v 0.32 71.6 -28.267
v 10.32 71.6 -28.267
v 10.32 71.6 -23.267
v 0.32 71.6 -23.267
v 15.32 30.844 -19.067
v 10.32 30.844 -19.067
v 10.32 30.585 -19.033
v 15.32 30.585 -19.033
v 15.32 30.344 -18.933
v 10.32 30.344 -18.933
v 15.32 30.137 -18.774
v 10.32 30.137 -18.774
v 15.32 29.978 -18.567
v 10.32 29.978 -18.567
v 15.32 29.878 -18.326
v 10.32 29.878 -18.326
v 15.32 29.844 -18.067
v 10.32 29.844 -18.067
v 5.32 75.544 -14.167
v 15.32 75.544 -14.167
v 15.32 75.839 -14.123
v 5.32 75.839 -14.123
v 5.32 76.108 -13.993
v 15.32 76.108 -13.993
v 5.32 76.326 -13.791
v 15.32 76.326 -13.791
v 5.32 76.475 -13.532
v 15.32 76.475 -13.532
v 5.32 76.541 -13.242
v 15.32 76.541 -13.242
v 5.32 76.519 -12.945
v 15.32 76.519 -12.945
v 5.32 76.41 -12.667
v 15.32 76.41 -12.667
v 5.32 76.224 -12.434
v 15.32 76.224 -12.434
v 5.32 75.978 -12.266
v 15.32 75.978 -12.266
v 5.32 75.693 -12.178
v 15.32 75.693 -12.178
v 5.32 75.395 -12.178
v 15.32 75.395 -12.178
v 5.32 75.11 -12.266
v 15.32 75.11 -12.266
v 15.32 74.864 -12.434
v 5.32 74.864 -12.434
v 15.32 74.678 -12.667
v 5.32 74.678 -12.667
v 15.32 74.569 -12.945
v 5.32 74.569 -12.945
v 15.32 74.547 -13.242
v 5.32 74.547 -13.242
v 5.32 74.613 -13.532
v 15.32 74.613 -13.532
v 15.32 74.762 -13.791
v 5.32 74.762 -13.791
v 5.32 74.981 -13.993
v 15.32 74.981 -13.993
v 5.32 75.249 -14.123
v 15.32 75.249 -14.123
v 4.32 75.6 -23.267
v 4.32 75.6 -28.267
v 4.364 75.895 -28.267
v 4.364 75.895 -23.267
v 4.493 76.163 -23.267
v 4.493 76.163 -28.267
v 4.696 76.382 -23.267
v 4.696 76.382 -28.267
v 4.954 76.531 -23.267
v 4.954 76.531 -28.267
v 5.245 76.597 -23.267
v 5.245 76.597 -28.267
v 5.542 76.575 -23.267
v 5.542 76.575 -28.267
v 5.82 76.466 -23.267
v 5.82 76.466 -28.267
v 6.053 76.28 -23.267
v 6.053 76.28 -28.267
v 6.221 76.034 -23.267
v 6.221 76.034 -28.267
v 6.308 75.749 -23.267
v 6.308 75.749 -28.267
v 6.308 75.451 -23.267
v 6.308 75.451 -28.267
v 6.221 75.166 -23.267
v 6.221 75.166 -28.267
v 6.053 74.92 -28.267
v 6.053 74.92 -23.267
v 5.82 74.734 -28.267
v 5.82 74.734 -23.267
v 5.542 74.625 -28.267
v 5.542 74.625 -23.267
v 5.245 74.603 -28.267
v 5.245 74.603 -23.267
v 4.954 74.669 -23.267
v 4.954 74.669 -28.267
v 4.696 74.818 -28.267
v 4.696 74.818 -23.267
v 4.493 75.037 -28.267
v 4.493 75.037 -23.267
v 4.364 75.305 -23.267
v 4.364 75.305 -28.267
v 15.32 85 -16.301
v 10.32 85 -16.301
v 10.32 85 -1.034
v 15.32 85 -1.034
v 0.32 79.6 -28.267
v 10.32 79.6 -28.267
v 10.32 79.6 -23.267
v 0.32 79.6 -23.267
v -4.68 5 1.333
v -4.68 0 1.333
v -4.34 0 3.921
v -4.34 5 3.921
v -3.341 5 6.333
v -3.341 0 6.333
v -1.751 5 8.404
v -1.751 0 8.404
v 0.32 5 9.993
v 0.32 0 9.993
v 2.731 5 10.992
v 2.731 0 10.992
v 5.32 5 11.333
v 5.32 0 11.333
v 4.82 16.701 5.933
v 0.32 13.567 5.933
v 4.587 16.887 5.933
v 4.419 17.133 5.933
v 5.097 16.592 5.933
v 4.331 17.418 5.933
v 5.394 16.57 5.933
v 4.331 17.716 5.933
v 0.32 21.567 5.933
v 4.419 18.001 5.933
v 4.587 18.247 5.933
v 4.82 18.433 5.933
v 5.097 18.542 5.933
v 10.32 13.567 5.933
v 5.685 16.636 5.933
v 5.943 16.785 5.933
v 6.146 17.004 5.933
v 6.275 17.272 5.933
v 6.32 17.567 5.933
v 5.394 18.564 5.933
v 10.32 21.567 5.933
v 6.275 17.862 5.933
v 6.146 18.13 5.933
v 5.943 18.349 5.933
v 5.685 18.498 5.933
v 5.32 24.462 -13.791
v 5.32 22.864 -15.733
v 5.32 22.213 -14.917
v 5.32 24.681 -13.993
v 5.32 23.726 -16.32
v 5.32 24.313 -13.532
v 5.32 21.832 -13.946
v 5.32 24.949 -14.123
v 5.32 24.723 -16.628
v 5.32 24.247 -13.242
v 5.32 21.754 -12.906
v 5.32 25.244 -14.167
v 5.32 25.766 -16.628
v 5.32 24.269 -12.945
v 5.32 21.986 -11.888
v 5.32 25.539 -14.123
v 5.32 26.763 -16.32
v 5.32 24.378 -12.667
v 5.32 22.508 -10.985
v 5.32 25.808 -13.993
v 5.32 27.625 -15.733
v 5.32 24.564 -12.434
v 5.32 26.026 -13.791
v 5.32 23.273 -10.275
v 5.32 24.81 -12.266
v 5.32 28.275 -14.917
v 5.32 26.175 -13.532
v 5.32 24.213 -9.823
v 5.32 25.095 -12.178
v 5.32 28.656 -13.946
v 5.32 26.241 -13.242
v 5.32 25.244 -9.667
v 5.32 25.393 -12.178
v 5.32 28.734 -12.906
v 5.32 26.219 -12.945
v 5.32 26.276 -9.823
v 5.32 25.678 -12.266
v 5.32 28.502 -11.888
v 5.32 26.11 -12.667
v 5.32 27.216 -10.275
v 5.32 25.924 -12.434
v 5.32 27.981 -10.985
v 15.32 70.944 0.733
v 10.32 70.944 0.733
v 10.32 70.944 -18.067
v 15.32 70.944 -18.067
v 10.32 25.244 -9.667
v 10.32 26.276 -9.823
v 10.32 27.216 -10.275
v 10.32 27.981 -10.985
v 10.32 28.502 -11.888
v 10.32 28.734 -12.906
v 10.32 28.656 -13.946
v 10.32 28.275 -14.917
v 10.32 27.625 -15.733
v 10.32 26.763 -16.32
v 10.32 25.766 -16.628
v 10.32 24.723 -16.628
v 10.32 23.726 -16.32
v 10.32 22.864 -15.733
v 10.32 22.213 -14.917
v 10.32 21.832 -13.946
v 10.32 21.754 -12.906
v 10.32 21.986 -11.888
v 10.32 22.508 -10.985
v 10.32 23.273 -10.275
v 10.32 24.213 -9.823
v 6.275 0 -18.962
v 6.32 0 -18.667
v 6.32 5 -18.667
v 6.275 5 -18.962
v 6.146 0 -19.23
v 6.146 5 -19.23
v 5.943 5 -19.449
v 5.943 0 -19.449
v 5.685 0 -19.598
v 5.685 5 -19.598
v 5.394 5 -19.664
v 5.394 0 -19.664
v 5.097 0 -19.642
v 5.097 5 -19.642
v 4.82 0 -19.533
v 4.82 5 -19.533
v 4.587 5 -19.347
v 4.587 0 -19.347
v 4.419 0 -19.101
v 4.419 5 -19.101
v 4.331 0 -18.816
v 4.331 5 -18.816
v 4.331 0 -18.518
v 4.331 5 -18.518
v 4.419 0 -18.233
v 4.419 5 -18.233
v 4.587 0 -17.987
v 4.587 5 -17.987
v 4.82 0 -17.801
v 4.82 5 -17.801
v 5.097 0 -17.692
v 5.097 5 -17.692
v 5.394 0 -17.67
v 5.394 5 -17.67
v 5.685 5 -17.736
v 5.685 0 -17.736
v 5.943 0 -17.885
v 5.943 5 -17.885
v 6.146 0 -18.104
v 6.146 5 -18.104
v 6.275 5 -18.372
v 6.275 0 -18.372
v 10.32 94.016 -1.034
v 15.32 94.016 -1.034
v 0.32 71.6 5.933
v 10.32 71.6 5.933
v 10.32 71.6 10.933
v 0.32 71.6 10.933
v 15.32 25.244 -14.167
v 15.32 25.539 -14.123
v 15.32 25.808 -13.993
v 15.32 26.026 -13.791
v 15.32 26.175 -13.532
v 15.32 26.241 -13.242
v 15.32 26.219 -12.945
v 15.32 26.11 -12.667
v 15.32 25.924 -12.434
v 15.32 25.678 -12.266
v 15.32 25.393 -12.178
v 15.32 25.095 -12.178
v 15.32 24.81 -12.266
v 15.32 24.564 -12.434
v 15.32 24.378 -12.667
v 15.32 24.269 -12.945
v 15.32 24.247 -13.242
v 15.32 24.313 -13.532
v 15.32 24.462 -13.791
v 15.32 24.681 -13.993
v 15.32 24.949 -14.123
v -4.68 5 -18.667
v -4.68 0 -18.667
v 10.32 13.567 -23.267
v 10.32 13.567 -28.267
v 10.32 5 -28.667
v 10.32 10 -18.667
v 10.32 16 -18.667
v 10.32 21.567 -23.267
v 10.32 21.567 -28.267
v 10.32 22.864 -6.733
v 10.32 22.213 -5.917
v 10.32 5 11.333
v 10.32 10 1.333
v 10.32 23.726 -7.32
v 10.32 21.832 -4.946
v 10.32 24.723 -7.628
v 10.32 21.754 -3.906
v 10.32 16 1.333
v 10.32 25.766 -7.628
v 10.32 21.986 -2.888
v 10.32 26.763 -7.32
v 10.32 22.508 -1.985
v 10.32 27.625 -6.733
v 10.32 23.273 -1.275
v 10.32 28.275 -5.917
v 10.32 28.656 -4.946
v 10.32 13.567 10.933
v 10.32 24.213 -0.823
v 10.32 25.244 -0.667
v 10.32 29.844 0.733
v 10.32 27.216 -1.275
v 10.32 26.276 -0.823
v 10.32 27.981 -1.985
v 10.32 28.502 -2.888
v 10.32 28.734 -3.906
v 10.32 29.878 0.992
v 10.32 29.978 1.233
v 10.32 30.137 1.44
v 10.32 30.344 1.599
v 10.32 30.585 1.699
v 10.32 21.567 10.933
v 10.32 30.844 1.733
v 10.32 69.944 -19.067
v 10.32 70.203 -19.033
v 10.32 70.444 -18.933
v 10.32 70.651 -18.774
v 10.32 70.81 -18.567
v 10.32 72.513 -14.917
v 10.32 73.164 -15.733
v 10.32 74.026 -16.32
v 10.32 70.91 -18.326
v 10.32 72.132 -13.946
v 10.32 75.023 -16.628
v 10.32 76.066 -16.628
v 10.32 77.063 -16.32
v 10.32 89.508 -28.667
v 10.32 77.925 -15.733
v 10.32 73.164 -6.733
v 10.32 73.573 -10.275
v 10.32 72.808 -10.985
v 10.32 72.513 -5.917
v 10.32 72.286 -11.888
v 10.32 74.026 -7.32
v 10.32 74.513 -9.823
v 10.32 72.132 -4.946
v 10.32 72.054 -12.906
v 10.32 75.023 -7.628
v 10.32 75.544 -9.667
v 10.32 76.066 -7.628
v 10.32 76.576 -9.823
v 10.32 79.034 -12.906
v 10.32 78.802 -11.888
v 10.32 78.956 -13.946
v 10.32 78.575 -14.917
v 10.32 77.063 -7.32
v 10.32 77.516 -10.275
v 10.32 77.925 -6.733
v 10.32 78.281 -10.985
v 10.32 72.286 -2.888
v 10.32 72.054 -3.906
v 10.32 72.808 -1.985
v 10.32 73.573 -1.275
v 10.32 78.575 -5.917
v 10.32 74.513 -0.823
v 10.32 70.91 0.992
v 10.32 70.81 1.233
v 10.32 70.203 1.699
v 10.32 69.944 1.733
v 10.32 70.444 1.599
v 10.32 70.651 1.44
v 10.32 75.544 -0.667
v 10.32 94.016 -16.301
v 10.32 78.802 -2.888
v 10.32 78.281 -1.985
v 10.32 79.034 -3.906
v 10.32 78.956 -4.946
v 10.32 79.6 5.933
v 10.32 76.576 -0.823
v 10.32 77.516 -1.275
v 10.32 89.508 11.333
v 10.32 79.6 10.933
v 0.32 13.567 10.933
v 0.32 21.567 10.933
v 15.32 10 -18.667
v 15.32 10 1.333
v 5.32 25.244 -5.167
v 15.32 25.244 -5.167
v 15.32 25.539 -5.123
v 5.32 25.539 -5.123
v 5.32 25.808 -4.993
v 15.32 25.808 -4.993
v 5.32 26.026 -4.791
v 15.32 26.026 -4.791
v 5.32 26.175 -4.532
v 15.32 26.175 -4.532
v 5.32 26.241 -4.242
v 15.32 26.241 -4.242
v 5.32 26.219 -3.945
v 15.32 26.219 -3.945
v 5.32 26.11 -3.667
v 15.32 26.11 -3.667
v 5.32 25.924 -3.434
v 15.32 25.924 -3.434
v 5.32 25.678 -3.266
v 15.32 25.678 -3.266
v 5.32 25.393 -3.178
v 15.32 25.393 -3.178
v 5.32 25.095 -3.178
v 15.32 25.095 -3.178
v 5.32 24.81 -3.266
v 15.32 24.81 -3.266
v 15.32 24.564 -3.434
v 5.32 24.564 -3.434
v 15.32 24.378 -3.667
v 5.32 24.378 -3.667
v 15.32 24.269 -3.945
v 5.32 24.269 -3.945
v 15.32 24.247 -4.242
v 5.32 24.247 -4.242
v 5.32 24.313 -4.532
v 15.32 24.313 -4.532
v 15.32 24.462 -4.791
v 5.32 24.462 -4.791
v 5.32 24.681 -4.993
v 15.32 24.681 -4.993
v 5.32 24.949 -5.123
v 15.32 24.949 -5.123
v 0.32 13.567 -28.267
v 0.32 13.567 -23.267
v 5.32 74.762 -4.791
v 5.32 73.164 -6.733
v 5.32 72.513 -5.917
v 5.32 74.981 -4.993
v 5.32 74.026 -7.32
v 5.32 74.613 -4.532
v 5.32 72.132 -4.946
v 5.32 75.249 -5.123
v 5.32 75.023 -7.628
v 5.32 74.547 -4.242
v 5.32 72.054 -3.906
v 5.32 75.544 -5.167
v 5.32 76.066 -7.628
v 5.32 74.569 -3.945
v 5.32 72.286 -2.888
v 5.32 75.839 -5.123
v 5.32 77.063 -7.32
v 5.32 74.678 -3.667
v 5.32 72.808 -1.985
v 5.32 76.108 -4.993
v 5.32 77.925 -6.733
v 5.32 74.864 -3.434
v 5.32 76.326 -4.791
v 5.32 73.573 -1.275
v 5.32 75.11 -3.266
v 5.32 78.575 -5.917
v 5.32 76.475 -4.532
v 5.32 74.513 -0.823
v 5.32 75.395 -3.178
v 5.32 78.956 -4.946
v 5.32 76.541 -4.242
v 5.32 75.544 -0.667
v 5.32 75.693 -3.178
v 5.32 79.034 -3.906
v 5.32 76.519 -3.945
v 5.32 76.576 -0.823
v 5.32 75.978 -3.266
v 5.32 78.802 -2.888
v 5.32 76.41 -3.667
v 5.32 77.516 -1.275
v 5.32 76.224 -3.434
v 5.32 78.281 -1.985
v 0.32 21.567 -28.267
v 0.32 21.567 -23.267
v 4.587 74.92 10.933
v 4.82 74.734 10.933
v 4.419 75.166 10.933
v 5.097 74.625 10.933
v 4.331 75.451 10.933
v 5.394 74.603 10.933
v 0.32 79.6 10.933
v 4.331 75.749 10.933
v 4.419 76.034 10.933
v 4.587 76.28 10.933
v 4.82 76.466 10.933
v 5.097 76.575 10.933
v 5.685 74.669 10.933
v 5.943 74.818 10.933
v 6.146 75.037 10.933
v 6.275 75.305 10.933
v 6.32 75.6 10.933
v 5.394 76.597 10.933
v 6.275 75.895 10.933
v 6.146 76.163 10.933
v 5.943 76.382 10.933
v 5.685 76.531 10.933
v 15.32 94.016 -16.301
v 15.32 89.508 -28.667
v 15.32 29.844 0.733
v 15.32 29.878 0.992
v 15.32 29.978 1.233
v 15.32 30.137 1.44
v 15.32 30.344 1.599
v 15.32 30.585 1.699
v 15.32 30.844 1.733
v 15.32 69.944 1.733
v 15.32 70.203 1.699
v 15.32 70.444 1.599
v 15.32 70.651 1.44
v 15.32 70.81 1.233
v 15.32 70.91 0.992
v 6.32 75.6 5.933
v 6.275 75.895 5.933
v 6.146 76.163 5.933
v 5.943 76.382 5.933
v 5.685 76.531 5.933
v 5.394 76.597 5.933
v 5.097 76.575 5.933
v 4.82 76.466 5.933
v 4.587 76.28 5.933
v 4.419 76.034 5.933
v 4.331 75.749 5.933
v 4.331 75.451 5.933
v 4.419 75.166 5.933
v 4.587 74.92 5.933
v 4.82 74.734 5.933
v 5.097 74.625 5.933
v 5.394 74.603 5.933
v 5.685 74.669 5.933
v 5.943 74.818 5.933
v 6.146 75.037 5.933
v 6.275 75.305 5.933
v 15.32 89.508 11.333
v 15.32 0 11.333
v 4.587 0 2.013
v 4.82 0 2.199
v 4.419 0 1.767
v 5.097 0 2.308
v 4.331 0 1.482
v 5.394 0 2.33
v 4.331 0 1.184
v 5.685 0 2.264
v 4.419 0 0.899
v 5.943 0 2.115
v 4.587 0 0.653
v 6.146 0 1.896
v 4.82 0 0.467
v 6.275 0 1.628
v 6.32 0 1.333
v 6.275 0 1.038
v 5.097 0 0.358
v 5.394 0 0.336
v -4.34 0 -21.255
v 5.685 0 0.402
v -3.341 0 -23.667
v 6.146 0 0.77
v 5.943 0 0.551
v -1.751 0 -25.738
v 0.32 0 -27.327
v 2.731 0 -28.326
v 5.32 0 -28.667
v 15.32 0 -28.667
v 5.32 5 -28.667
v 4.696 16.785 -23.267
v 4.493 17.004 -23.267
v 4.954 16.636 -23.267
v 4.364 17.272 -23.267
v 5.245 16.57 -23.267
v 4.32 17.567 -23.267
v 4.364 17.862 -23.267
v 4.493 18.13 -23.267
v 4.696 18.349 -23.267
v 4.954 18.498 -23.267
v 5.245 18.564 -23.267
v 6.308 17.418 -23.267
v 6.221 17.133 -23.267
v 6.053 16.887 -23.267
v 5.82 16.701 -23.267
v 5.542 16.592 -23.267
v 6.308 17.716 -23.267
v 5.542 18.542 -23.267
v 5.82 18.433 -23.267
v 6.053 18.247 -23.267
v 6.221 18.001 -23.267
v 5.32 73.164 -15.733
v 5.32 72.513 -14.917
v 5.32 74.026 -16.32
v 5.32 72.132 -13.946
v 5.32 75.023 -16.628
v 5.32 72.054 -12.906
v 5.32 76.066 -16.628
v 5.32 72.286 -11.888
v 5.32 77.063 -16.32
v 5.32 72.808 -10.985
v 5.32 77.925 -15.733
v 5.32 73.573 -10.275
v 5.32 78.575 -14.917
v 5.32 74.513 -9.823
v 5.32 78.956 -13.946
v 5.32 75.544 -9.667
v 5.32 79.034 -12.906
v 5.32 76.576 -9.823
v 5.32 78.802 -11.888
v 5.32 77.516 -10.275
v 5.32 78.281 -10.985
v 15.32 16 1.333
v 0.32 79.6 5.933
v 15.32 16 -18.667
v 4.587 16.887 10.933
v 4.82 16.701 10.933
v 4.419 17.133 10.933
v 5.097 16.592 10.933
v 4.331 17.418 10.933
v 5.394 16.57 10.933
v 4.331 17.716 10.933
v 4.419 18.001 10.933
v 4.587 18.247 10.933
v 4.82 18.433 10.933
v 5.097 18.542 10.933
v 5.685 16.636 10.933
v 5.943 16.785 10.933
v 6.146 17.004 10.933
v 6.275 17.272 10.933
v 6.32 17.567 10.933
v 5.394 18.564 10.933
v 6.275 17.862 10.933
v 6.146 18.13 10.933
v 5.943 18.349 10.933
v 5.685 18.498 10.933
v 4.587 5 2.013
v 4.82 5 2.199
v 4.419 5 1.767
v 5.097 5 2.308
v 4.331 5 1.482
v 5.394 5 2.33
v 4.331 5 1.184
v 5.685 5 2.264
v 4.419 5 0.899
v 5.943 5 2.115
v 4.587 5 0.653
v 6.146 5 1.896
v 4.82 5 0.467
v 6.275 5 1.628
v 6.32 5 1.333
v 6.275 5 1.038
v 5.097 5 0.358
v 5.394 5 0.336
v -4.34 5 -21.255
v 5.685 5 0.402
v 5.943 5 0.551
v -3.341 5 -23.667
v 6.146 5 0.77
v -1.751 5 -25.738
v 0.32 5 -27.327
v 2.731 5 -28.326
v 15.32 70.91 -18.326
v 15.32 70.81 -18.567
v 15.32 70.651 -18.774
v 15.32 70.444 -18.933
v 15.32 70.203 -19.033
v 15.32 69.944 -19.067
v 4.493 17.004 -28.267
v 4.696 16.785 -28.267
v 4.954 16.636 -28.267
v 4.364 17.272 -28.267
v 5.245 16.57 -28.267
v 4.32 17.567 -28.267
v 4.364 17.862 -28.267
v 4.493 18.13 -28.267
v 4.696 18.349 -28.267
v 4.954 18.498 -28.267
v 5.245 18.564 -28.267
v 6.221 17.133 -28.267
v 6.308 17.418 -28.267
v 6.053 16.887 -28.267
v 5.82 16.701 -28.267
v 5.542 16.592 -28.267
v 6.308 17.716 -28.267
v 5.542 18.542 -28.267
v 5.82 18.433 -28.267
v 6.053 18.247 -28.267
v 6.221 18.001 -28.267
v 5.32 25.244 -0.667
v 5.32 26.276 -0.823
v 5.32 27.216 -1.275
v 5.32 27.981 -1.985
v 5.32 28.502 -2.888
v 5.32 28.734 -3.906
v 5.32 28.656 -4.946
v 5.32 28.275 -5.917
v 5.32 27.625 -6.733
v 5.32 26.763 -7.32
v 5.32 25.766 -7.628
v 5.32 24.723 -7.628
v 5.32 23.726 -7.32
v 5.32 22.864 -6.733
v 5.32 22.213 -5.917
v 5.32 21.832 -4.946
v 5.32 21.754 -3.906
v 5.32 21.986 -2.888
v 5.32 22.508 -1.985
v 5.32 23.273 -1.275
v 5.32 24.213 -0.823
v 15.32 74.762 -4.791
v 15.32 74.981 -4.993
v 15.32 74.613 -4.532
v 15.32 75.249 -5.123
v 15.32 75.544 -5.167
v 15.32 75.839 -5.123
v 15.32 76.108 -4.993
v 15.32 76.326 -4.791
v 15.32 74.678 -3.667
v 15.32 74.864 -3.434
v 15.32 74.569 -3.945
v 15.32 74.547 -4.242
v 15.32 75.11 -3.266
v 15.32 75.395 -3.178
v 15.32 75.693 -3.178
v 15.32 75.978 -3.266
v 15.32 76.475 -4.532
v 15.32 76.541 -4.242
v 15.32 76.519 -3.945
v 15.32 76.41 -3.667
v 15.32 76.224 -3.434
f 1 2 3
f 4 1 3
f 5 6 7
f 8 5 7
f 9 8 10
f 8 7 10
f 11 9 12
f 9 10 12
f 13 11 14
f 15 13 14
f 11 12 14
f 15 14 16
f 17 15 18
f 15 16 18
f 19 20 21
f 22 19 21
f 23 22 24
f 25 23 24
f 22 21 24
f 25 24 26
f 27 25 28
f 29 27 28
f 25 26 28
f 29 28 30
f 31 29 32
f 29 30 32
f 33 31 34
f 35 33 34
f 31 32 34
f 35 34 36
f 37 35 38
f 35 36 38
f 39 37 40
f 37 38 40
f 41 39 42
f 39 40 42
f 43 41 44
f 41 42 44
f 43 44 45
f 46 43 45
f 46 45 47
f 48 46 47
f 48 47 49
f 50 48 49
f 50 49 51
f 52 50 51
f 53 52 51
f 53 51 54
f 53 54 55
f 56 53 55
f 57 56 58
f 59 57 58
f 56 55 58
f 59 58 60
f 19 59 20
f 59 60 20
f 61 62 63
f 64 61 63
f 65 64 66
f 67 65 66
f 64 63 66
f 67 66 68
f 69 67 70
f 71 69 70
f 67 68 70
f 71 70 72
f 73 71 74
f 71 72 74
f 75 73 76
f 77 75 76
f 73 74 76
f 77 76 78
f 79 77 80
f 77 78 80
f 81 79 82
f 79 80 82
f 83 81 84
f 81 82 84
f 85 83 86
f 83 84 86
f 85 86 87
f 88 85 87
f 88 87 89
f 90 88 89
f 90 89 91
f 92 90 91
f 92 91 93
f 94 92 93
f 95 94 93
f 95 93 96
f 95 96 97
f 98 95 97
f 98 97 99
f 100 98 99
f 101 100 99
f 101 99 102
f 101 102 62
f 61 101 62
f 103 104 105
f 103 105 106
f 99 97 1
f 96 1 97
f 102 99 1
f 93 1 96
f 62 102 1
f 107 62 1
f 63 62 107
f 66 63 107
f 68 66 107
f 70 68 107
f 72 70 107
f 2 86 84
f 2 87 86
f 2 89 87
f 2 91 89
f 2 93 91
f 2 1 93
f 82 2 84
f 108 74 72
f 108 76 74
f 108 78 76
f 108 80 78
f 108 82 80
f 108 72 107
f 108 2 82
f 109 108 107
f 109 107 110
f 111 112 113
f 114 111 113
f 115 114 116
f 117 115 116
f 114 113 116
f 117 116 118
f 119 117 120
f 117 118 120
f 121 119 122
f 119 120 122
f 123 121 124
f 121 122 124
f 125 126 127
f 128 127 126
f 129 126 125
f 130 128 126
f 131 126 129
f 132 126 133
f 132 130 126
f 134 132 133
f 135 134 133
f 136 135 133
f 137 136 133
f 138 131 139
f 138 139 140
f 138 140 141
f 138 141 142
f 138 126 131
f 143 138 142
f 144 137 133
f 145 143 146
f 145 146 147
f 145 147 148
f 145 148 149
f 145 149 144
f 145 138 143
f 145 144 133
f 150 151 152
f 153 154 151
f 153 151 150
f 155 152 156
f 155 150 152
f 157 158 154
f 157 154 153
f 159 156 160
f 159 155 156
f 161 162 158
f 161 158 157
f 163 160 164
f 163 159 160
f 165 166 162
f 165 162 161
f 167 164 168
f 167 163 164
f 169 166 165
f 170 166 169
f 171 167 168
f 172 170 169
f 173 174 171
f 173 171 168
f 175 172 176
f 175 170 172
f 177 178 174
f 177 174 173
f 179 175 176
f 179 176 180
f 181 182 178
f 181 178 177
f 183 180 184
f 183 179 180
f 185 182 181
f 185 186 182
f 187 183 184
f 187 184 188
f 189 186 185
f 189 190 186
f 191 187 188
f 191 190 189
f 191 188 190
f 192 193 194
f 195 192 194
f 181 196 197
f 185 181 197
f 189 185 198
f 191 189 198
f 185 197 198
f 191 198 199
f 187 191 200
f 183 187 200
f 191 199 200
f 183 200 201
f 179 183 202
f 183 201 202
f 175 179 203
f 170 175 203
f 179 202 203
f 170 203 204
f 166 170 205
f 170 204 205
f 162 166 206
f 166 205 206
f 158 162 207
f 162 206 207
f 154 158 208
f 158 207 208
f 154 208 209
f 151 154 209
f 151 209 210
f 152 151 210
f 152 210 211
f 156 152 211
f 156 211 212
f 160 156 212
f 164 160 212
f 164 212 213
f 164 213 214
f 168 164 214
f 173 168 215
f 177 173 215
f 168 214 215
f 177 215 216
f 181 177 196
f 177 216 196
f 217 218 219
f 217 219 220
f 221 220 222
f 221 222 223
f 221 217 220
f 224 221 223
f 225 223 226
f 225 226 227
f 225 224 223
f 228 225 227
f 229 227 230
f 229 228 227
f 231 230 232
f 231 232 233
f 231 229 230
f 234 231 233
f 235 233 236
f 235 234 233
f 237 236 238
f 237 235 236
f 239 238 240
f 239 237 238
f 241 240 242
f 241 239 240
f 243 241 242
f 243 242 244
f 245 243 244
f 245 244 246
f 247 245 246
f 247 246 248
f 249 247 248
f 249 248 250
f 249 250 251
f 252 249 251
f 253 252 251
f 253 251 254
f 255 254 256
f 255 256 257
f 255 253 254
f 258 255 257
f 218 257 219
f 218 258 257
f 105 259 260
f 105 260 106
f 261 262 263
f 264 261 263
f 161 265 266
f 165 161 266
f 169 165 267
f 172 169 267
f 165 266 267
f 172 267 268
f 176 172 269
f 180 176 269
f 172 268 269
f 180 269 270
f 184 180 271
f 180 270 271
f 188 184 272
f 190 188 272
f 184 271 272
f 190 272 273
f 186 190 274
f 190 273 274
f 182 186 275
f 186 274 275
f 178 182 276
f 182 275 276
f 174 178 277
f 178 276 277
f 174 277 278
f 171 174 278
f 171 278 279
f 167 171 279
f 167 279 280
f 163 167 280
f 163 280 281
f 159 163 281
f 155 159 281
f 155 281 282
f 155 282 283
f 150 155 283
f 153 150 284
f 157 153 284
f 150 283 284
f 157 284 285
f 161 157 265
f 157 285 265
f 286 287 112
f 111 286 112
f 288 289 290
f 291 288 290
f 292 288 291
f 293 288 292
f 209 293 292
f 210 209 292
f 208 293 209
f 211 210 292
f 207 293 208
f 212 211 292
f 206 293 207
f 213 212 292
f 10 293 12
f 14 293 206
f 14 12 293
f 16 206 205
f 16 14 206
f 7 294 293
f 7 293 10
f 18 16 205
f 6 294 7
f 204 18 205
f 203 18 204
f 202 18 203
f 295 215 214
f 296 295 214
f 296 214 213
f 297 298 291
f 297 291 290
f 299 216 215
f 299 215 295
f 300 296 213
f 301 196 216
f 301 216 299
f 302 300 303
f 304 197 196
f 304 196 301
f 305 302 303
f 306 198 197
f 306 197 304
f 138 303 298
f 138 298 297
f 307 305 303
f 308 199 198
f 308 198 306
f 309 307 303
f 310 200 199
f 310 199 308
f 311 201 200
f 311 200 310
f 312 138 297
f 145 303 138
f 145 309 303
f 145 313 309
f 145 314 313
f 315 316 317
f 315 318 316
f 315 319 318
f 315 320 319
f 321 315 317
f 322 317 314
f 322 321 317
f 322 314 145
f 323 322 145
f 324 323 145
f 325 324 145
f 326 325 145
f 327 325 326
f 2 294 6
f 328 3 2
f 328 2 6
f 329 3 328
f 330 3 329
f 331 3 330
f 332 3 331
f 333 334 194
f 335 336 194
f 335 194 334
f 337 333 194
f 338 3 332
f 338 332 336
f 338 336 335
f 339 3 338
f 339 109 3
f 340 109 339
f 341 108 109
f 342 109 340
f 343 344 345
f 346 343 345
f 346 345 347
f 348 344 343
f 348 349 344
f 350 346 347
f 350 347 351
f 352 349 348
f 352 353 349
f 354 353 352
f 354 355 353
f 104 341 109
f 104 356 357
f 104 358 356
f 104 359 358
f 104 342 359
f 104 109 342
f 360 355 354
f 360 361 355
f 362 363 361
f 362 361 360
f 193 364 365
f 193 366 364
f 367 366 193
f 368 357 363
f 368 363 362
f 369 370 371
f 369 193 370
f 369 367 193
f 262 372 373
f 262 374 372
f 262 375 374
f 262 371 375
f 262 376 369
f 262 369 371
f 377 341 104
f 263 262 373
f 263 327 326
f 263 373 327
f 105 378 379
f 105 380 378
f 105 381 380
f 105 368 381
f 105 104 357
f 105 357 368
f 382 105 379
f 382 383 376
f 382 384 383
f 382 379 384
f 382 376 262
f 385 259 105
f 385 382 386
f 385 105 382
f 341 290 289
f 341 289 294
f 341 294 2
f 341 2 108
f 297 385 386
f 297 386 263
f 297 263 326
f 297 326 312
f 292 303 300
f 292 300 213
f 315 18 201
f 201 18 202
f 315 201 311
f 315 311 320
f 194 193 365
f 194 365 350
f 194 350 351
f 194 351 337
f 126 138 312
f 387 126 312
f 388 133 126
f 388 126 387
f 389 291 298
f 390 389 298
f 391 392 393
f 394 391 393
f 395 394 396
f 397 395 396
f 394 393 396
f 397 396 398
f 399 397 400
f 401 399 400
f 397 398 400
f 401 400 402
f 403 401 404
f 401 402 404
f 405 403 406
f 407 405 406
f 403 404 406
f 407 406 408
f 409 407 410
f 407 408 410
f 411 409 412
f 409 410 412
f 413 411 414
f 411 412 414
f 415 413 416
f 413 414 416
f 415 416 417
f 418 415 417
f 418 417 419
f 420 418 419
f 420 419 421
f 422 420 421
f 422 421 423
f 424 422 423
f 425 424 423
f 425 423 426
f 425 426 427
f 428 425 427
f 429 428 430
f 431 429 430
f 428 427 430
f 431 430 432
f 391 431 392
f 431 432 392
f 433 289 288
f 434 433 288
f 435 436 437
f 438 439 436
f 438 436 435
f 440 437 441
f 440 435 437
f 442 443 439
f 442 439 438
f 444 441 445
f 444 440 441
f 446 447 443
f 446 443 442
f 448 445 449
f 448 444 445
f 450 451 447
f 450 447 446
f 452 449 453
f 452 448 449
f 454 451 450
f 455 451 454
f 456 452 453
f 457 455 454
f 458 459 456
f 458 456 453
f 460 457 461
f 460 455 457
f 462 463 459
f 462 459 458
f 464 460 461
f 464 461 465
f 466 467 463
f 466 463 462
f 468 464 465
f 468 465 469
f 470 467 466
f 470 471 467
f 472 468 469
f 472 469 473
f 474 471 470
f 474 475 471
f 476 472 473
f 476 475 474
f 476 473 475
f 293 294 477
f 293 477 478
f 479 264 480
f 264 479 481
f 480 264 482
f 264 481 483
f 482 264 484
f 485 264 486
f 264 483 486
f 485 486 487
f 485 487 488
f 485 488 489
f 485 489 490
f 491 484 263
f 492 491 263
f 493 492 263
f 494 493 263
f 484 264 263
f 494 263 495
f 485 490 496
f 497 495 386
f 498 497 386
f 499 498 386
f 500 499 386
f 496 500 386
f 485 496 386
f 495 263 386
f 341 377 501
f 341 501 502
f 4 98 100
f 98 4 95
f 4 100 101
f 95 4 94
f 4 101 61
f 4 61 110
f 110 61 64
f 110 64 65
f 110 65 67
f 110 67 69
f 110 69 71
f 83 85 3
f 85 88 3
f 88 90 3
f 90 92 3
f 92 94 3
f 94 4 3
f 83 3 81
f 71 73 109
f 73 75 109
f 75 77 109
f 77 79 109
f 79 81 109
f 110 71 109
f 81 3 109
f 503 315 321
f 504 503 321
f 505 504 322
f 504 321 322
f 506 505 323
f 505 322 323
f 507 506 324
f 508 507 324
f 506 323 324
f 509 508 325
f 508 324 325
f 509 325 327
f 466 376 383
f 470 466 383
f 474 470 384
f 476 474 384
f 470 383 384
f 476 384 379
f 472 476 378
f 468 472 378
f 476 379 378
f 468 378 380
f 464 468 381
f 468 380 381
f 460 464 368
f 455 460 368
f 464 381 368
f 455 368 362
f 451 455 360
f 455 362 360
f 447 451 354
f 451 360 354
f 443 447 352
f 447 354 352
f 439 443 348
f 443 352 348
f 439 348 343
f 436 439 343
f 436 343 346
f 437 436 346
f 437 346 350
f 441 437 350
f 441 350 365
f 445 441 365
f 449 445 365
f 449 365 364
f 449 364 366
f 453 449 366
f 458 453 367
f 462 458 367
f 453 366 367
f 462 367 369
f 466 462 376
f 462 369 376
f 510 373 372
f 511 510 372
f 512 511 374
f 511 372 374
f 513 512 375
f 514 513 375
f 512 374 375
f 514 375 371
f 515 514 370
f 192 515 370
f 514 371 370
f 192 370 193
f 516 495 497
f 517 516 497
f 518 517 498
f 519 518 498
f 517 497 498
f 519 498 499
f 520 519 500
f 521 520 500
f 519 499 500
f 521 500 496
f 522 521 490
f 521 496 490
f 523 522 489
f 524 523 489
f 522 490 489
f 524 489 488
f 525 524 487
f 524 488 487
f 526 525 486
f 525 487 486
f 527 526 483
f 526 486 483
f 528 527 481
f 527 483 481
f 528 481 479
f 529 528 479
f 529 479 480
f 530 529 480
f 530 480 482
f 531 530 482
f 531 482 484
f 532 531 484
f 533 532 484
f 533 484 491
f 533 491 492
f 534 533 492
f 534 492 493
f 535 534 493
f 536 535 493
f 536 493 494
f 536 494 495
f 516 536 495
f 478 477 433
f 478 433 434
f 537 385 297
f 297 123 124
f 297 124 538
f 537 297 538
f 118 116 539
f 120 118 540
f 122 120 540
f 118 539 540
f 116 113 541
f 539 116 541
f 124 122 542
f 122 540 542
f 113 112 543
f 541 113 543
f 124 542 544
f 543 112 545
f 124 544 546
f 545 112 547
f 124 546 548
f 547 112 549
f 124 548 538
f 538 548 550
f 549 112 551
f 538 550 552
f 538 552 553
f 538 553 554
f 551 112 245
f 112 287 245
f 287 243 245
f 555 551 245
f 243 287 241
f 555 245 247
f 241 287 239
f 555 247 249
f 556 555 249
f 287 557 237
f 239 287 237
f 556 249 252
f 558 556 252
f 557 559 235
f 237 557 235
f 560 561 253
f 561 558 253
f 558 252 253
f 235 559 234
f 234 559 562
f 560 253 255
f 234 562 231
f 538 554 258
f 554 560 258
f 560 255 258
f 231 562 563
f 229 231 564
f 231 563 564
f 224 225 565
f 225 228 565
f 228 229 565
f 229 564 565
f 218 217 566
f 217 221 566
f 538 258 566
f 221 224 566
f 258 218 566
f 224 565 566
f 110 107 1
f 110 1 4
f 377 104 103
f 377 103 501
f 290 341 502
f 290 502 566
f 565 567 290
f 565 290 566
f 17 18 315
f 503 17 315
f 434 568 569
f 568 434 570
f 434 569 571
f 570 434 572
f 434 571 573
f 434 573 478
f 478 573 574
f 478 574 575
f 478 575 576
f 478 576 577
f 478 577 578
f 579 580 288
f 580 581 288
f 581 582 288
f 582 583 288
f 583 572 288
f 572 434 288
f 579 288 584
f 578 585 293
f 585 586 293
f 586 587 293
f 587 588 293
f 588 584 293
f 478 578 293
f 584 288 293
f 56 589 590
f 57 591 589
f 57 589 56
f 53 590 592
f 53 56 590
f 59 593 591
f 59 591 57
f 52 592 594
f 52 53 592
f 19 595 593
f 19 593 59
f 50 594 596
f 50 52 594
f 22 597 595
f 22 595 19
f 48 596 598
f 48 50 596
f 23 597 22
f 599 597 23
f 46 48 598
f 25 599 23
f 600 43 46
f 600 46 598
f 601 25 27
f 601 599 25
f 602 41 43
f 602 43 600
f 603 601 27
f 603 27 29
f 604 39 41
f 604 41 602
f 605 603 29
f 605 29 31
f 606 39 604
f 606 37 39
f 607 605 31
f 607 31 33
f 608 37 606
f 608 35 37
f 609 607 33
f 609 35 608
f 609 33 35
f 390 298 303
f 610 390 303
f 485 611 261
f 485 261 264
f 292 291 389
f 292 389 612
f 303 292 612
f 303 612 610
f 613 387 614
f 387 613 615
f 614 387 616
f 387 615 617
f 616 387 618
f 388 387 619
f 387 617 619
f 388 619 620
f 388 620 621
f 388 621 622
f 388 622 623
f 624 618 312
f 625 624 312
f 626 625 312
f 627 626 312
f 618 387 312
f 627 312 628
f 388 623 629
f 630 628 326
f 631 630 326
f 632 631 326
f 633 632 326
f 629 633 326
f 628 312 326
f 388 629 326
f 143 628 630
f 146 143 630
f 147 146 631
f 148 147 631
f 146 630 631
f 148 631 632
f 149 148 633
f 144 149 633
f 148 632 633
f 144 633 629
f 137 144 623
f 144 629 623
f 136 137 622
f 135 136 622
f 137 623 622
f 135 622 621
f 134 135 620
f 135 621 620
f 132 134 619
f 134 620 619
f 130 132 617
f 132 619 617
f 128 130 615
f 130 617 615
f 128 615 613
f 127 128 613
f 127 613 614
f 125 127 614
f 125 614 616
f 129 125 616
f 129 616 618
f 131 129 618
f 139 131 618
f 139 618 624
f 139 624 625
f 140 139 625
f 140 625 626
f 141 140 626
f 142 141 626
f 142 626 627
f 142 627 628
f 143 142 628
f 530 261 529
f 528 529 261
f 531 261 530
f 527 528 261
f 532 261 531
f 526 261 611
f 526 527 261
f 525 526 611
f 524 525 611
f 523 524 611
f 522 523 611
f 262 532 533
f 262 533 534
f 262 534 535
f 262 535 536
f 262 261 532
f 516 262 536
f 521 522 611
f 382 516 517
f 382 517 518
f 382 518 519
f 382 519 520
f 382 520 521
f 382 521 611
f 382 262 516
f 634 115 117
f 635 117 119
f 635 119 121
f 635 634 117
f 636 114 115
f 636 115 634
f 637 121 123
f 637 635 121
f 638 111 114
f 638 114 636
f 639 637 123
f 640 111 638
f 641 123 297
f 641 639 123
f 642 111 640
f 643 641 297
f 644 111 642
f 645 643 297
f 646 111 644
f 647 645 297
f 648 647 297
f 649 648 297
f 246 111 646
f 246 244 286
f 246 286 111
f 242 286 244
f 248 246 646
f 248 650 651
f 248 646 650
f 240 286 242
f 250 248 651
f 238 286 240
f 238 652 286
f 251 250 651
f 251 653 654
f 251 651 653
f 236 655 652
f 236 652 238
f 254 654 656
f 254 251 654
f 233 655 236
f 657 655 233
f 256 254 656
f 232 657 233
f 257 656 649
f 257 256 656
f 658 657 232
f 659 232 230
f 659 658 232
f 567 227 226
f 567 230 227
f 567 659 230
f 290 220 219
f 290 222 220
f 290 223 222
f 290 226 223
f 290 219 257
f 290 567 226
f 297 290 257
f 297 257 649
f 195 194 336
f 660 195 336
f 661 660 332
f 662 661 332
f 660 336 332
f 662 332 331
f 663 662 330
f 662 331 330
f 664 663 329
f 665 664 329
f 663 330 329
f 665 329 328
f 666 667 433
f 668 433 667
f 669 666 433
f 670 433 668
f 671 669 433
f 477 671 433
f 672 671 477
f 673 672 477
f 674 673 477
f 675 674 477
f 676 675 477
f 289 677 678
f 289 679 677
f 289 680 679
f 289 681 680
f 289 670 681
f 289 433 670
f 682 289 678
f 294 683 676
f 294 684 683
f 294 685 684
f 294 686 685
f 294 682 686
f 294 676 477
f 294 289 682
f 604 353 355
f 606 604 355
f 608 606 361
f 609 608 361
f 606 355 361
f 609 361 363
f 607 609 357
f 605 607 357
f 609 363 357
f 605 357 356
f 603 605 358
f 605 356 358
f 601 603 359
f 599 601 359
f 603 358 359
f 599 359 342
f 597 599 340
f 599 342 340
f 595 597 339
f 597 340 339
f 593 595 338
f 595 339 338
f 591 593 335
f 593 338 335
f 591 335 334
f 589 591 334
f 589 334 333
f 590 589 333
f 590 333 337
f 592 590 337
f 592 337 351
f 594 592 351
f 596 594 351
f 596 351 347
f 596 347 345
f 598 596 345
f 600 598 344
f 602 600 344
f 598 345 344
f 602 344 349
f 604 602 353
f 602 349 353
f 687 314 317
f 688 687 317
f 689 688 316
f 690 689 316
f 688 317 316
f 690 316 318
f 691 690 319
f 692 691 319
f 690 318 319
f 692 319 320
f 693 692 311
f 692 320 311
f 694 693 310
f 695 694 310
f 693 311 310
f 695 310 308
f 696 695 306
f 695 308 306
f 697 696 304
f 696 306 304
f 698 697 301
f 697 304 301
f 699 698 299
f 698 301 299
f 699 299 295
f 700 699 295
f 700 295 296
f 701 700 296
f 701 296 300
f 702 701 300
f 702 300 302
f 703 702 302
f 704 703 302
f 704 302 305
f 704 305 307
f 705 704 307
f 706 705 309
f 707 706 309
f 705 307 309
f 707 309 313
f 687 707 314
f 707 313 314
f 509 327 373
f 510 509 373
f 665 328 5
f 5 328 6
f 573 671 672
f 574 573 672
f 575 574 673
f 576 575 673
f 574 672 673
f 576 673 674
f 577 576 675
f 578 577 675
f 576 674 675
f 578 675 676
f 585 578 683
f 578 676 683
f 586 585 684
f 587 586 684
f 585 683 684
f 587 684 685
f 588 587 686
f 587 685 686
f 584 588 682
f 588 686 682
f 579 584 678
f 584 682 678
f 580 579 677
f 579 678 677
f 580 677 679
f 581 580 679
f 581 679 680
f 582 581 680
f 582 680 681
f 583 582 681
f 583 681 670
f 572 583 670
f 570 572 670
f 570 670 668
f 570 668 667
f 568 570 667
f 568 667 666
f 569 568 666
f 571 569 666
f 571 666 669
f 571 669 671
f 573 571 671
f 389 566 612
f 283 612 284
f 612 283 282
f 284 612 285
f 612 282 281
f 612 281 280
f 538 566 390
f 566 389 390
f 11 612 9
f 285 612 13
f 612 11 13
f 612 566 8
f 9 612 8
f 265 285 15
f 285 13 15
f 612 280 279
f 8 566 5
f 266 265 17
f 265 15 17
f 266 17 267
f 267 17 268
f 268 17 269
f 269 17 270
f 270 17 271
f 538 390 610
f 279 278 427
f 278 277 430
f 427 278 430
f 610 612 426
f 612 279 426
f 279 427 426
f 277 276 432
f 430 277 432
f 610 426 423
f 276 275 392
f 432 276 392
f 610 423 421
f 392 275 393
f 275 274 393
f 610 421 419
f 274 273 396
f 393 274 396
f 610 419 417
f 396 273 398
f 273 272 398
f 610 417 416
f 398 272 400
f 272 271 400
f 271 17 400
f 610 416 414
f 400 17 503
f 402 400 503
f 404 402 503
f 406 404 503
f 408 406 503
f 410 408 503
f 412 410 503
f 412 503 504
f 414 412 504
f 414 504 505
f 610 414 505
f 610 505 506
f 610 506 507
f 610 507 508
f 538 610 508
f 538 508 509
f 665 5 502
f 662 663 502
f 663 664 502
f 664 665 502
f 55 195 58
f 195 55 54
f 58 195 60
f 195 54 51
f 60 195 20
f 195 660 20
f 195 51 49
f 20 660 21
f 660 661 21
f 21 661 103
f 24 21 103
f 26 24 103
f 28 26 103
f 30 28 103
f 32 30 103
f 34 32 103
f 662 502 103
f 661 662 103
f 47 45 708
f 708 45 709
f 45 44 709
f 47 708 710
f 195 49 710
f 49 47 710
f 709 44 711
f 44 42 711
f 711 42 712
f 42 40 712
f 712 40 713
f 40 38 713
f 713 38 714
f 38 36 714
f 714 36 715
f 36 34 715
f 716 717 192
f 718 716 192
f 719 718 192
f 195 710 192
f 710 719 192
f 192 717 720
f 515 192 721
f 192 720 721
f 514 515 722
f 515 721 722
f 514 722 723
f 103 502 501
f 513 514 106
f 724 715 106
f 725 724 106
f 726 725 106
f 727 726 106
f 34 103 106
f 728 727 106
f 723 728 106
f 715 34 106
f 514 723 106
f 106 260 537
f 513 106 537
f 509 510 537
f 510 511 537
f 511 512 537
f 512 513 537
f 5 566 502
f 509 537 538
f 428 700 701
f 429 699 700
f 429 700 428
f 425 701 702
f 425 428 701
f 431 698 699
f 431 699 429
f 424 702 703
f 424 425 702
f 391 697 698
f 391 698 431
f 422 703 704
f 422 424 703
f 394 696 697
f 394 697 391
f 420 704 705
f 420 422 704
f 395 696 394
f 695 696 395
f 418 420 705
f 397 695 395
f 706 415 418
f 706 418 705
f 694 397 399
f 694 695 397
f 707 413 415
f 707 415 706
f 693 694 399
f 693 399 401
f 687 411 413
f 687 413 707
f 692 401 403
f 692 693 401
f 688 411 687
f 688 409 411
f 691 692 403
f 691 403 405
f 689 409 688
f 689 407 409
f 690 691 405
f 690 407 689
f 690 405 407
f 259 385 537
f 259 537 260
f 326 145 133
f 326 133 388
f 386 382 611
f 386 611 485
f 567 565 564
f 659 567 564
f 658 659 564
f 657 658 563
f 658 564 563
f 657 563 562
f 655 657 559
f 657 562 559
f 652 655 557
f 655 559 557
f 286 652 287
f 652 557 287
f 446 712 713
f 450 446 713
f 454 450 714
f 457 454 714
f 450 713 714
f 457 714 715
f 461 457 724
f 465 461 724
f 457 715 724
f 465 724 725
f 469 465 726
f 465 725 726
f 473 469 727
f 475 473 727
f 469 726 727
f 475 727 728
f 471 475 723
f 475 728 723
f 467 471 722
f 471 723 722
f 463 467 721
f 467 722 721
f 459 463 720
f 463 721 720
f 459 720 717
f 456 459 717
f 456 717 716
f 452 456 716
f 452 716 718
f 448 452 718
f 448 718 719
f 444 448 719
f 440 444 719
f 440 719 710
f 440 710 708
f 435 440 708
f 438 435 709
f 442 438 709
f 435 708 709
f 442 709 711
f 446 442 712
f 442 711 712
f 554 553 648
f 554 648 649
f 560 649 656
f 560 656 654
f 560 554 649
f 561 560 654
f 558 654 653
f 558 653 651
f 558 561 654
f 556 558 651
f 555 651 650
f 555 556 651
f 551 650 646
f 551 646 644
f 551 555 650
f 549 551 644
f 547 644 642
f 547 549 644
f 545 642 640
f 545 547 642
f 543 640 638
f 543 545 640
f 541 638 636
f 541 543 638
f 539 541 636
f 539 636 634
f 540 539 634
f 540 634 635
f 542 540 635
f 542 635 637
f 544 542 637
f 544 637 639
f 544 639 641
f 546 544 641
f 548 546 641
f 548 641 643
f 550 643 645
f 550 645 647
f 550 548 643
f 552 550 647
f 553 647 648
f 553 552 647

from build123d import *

# Parameters (mm, degrees)
SKETCH1_R           = 1
BOSS_EXTRUDE1_DEPTH = 5
SKETCH2_W           = 5
SKETCH2_H           = 40
BOSS_EXTRUDE2_DEPTH = 80
SKETCH3_R           = 2.22
CUT_EXTRUDE3_DEPTH  = 80
SKETCH5_R           = 2.22
SKETCH5_R_2         = 1
BOSS_EXTRUDE3_DEPTH = 10
SKETCH6_R           = 3.5
SKETCH6_R_2         = 2.22
BOSS_EXTRUDE4_DEPTH = 5
SKETCH7_W           = 18.8
SKETCH7_H           = 4.557781783
CUT_EXTRUDE4_DEPTH  = 10
BOSS_EXTRUDE5_DEPTH = 5
SKETCH9_W           = 20
SKETCH9_H           = 6
CUT_EXTRUDE7_DEPTH  = 10
SKETCH10_W          = 5
SKETCH10_H          = 8
BOSS_EXTRUDE6_DEPTH = 10
SKETCH11_R          = 1
CUT_EXTRUDE9_DEPTH  = 8
SKETCH12_R          = 1
CUT_EXTRUDE10_DEPTH = 8


with BuildPart() as part:
    # Sketch1 → Boss-Extrude1 (new body)
    with BuildSketch(Plane(origin=(0, 0, 0), x_dir=(1, 0, 0), z_dir=(0, 1, 0))):
        with BuildLine():
            Line((5.319641756, -11.332905968), (15.319641756, -11.332905968))
            Line((15.319641756, -11.332905968), (15.319641756, 28.667094032))
            Line((15.319641756, 28.667094032), (5.319641756, 28.667094032))
            ThreePointArc((5.319641756, 28.667094032), (-1.751426056, 25.738161844), (-4.680358244, 18.667094032))
            Line((-4.680358244, 18.667094032), (-4.680358244, -1.332905968))
            ThreePointArc((-4.680358244, -1.332905968), (-1.751426056, -8.40397378), (5.319641756, -11.332905968))
        make_face()
        with Locations((5.319641756, 18.667094032)):
            Circle(SKETCH1_R, mode=Mode.SUBTRACT)
        with Locations((5.319641756, -1.332905968)):
            Circle(SKETCH1_R, mode=Mode.SUBTRACT)
    extrude(amount=BOSS_EXTRUDE1_DEPTH)

    # Sketch2 → Boss-Extrude2 (add)
    with BuildSketch(Plane(origin=(0, 5, 0), x_dir=(1, 0, 0), z_dir=(0, 1, 0))):
        with Locations((12.819641756, 8.667094032)):
            Rectangle(SKETCH2_W, SKETCH2_H)
    extrude(amount=BOSS_EXTRUDE2_DEPTH)

    # Sketch3 → Cut-Extrude3 (cut)
    with BuildSketch(Plane.ZY.offset(-10.319641756)):
        with BuildLine():
            ThreePointArc((0.732905968, 35.401978793), (1.440012749, 35.694872012), (1.732905968, 36.401978793))
            Line((1.732905968, 36.401978793), (1.732905968, 69.94419701))
            ThreePointArc((1.732905968, 69.94419701), (1.440012749, 70.651303792), (0.732905968, 70.94419701))
            Line((0.732905968, 70.94419701), (-18.067094032, 70.94419701))
            ThreePointArc((-18.067094032, 70.94419701), (-18.774200813, 70.651303792), (-19.067094032, 69.94419701))
            Line((-19.067094032, 69.94419701), (-19.067094032, 36.401978793))
            ThreePointArc((-19.067094032, 36.401978793), (-18.774200813, 35.694872012), (-18.067094032, 35.401978793))
            Line((-18.067094032, 35.401978793), (0.732905968, 35.401978793))
        make_face()
        with Locations((-13.167094032, 75.54419701)):
            Circle(SKETCH3_R)
        with Locations((-13.167094032, 25.24419701)):
            Circle(SKETCH3_R)
        with Locations((-4.167094032, 25.24419701)):
            Circle(SKETCH3_R)
        with Locations((-4.167094032, 75.54419701)):
            Circle(SKETCH3_R)
    extrude(amount=-CUT_EXTRUDE3_DEPTH, mode=Mode.SUBTRACT)

    # Sketch5 → Boss-Extrude3 (add)
    with BuildSketch(Plane(origin=(15.319641756, 0, 0), x_dir=(0, 0, -1), z_dir=(1, 0, 0))):
        with Locations((4.167094032, 25.24419701)):
            Circle(SKETCH5_R)
        with Locations((4.167094032, 25.24419701)):
            Circle(SKETCH5_R_2, mode=Mode.SUBTRACT)
        with Locations((13.167094032, 25.24419701)):
            Circle(SKETCH5_R)
        with Locations((13.167094032, 25.24419701)):
            Circle(SKETCH5_R_2, mode=Mode.SUBTRACT)
        with Locations((4.167094032, 75.54419701)):
            Circle(SKETCH5_R)
        with Locations((4.167094032, 75.54419701)):
            Circle(SKETCH5_R_2, mode=Mode.SUBTRACT)
        with Locations((13.167094032, 75.54419701)):
            Circle(SKETCH5_R)
        with Locations((13.167094032, 75.54419701)):
            Circle(SKETCH5_R_2, mode=Mode.SUBTRACT)
    extrude(amount=-BOSS_EXTRUDE3_DEPTH)

    # Sketch6 → Boss-Extrude4 (add)
    with BuildSketch(Plane.ZY.offset(-10.319641756)):
        with Locations((-4.167094032, 25.24419701)):
            Circle(SKETCH6_R)
        with Locations((-4.167094032, 25.24419701)):
            Circle(SKETCH6_R_2, mode=Mode.SUBTRACT)
        with Locations((-13.167094032, 25.24419701)):
            Circle(SKETCH6_R)
        with Locations((-13.167094032, 25.24419701)):
            Circle(SKETCH6_R_2, mode=Mode.SUBTRACT)
        with Locations((-4.167094032, 75.54419701)):
            Circle(SKETCH6_R)
        with Locations((-4.167094032, 75.54419701)):
            Circle(SKETCH6_R_2, mode=Mode.SUBTRACT)
        with Locations((-13.167094032, 75.54419701)):
            Circle(SKETCH6_R)
        with Locations((-13.167094032, 75.54419701)):
            Circle(SKETCH6_R_2, mode=Mode.SUBTRACT)
    extrude(amount=BOSS_EXTRUDE4_DEPTH)

    # Sketch7 → Cut-Extrude4 (cut)
    with BuildSketch(Plane.ZY.offset(-10.319641756)):
        with BuildLine():
            ThreePointArc((1.732905968, 36.401978793), (1.627333159, 35.954765198), (1.332905968, 35.601978793))
            Line((1.332905968, 35.601978793), (1.332905968, 30.84419701))
            ThreePointArc((1.332905968, 30.84419701), (1.157170037, 30.419932942), (0.732905968, 30.24419701))
            Line((0.732905968, 30.24419701), (-18.067094032, 30.24419701))
            ThreePointArc((-18.067094032, 30.24419701), (-18.491358101, 30.419932942), (-18.667094032, 30.84419701))
            Line((-18.667094032, 30.84419701), (-18.667094032, 35.601978793))
            ThreePointArc((-18.667094032, 35.601978793), (-18.961521223, 35.954765198), (-19.067094032, 36.401978793))
            Line((-19.067094032, 36.401978793), (-19.067094032, 30.84419701))
            ThreePointArc((-19.067094032, 30.84419701), (-18.774200813, 30.137090229), (-18.067094032, 29.84419701))
            Line((-18.067094032, 29.84419701), (0.732905968, 29.84419701))
            ThreePointArc((0.732905968, 29.84419701), (1.440012749, 30.137090229), (1.732905968, 30.84419701))
            Line((1.732905968, 30.84419701), (1.732905968, 36.401978793))
        make_face()
        with BuildLine():
            Line((1.332905968, 30.84419701), (1.332905968, 35.601978793))
            ThreePointArc((1.332905968, 35.601978793), (1.049133734, 35.453295495), (0.732905968, 35.401978793))
            Line((0.732905968, 35.401978793), (0.732905968, 30.84419701))
            Line((0.732905968, 30.84419701), (-18.067094032, 30.84419701))
            Line((-18.067094032, 30.84419701), (-18.067094032, 35.401978793))
            ThreePointArc((-18.067094032, 35.401978793), (-18.383321798, 35.453295495), (-18.667094032, 35.601978793))
            Line((-18.667094032, 35.601978793), (-18.667094032, 30.84419701))
            ThreePointArc((-18.667094032, 30.84419701), (-18.491358101, 30.419932942), (-18.067094032, 30.24419701))
            Line((-18.067094032, 30.24419701), (0.732905968, 30.24419701))
            ThreePointArc((0.732905968, 30.24419701), (1.157170037, 30.419932942), (1.332905968, 30.84419701))
        make_face()
        with Locations((-8.667094032, 33.123087901)):
            Rectangle(SKETCH7_W, SKETCH7_H)
    extrude(amount=-CUT_EXTRUDE4_DEPTH, mode=Mode.SUBTRACT)

    # Sketch8 → Boss-Extrude5 (add, through all)
    with BuildSketch(Plane.ZY.offset(-10.319641756)):
        Polygon((-28.667094032, 89.50779106), (-28.667094032, 85), (-16.300533883, 85), (-16.300533883, 94.015582119), align=None)
        Polygon((-1.033654181, 94.015582119), (-1.033654181, 85), (11.332905968, 85), (11.332905968, 89.50779106), align=None)
    extrude(amount=-BOSS_EXTRUDE5_DEPTH)

    # Sketch9 → Cut-Extrude7 (cut)
    with BuildSketch(Plane.ZY.offset(-10.319641756)):
        with Locations((-8.667094032, 13)):
            Rectangle(SKETCH9_W, SKETCH9_H)
    extrude(amount=-CUT_EXTRUDE7_DEPTH, mode=Mode.SUBTRACT)

    # Sketch10 → Boss-Extrude6 (add)
    with BuildSketch(Plane.ZY.offset(-10.319641756)):
        with Locations((-25.767094032, 17.566871705)):
            Rectangle(SKETCH10_W, SKETCH10_H)
        with Locations((8.432905968, 17.566871705)):
            Rectangle(SKETCH10_W, SKETCH10_H)
        with Locations((8.432905968, 75.6)):
            Rectangle(SKETCH10_W, SKETCH10_H)
        with Locations((-25.767094032, 75.6)):
            Rectangle(SKETCH10_W, SKETCH10_H)
    extrude(amount=BOSS_EXTRUDE6_DEPTH)

    # Sketch11 → Cut-Extrude9 (cut)
    with BuildSketch(Plane.XY.offset(10.932905968)):
        with Locations((5.319641756, 17.566871705)):
            Circle(SKETCH11_R)
        with Locations((5.319641756, 75.6)):
            Circle(SKETCH11_R)
    extrude(amount=-CUT_EXTRUDE9_DEPTH, mode=Mode.SUBTRACT)

    # Sketch12 → Cut-Extrude10 (cut)
    with BuildSketch(Plane(origin=(0, 0, -28.267094032), x_dir=(-1, 0, 0), z_dir=(0, 0, -1))):
        with Locations((-5.319641756, 75.6)):
            Circle(SKETCH12_R)
        with Locations((-5.319641756, 17.566871705)):
            Circle(SKETCH12_R)
    extrude(amount=-CUT_EXTRUDE10_DEPTH, mode=Mode.SUBTRACT)


solid = part.part
